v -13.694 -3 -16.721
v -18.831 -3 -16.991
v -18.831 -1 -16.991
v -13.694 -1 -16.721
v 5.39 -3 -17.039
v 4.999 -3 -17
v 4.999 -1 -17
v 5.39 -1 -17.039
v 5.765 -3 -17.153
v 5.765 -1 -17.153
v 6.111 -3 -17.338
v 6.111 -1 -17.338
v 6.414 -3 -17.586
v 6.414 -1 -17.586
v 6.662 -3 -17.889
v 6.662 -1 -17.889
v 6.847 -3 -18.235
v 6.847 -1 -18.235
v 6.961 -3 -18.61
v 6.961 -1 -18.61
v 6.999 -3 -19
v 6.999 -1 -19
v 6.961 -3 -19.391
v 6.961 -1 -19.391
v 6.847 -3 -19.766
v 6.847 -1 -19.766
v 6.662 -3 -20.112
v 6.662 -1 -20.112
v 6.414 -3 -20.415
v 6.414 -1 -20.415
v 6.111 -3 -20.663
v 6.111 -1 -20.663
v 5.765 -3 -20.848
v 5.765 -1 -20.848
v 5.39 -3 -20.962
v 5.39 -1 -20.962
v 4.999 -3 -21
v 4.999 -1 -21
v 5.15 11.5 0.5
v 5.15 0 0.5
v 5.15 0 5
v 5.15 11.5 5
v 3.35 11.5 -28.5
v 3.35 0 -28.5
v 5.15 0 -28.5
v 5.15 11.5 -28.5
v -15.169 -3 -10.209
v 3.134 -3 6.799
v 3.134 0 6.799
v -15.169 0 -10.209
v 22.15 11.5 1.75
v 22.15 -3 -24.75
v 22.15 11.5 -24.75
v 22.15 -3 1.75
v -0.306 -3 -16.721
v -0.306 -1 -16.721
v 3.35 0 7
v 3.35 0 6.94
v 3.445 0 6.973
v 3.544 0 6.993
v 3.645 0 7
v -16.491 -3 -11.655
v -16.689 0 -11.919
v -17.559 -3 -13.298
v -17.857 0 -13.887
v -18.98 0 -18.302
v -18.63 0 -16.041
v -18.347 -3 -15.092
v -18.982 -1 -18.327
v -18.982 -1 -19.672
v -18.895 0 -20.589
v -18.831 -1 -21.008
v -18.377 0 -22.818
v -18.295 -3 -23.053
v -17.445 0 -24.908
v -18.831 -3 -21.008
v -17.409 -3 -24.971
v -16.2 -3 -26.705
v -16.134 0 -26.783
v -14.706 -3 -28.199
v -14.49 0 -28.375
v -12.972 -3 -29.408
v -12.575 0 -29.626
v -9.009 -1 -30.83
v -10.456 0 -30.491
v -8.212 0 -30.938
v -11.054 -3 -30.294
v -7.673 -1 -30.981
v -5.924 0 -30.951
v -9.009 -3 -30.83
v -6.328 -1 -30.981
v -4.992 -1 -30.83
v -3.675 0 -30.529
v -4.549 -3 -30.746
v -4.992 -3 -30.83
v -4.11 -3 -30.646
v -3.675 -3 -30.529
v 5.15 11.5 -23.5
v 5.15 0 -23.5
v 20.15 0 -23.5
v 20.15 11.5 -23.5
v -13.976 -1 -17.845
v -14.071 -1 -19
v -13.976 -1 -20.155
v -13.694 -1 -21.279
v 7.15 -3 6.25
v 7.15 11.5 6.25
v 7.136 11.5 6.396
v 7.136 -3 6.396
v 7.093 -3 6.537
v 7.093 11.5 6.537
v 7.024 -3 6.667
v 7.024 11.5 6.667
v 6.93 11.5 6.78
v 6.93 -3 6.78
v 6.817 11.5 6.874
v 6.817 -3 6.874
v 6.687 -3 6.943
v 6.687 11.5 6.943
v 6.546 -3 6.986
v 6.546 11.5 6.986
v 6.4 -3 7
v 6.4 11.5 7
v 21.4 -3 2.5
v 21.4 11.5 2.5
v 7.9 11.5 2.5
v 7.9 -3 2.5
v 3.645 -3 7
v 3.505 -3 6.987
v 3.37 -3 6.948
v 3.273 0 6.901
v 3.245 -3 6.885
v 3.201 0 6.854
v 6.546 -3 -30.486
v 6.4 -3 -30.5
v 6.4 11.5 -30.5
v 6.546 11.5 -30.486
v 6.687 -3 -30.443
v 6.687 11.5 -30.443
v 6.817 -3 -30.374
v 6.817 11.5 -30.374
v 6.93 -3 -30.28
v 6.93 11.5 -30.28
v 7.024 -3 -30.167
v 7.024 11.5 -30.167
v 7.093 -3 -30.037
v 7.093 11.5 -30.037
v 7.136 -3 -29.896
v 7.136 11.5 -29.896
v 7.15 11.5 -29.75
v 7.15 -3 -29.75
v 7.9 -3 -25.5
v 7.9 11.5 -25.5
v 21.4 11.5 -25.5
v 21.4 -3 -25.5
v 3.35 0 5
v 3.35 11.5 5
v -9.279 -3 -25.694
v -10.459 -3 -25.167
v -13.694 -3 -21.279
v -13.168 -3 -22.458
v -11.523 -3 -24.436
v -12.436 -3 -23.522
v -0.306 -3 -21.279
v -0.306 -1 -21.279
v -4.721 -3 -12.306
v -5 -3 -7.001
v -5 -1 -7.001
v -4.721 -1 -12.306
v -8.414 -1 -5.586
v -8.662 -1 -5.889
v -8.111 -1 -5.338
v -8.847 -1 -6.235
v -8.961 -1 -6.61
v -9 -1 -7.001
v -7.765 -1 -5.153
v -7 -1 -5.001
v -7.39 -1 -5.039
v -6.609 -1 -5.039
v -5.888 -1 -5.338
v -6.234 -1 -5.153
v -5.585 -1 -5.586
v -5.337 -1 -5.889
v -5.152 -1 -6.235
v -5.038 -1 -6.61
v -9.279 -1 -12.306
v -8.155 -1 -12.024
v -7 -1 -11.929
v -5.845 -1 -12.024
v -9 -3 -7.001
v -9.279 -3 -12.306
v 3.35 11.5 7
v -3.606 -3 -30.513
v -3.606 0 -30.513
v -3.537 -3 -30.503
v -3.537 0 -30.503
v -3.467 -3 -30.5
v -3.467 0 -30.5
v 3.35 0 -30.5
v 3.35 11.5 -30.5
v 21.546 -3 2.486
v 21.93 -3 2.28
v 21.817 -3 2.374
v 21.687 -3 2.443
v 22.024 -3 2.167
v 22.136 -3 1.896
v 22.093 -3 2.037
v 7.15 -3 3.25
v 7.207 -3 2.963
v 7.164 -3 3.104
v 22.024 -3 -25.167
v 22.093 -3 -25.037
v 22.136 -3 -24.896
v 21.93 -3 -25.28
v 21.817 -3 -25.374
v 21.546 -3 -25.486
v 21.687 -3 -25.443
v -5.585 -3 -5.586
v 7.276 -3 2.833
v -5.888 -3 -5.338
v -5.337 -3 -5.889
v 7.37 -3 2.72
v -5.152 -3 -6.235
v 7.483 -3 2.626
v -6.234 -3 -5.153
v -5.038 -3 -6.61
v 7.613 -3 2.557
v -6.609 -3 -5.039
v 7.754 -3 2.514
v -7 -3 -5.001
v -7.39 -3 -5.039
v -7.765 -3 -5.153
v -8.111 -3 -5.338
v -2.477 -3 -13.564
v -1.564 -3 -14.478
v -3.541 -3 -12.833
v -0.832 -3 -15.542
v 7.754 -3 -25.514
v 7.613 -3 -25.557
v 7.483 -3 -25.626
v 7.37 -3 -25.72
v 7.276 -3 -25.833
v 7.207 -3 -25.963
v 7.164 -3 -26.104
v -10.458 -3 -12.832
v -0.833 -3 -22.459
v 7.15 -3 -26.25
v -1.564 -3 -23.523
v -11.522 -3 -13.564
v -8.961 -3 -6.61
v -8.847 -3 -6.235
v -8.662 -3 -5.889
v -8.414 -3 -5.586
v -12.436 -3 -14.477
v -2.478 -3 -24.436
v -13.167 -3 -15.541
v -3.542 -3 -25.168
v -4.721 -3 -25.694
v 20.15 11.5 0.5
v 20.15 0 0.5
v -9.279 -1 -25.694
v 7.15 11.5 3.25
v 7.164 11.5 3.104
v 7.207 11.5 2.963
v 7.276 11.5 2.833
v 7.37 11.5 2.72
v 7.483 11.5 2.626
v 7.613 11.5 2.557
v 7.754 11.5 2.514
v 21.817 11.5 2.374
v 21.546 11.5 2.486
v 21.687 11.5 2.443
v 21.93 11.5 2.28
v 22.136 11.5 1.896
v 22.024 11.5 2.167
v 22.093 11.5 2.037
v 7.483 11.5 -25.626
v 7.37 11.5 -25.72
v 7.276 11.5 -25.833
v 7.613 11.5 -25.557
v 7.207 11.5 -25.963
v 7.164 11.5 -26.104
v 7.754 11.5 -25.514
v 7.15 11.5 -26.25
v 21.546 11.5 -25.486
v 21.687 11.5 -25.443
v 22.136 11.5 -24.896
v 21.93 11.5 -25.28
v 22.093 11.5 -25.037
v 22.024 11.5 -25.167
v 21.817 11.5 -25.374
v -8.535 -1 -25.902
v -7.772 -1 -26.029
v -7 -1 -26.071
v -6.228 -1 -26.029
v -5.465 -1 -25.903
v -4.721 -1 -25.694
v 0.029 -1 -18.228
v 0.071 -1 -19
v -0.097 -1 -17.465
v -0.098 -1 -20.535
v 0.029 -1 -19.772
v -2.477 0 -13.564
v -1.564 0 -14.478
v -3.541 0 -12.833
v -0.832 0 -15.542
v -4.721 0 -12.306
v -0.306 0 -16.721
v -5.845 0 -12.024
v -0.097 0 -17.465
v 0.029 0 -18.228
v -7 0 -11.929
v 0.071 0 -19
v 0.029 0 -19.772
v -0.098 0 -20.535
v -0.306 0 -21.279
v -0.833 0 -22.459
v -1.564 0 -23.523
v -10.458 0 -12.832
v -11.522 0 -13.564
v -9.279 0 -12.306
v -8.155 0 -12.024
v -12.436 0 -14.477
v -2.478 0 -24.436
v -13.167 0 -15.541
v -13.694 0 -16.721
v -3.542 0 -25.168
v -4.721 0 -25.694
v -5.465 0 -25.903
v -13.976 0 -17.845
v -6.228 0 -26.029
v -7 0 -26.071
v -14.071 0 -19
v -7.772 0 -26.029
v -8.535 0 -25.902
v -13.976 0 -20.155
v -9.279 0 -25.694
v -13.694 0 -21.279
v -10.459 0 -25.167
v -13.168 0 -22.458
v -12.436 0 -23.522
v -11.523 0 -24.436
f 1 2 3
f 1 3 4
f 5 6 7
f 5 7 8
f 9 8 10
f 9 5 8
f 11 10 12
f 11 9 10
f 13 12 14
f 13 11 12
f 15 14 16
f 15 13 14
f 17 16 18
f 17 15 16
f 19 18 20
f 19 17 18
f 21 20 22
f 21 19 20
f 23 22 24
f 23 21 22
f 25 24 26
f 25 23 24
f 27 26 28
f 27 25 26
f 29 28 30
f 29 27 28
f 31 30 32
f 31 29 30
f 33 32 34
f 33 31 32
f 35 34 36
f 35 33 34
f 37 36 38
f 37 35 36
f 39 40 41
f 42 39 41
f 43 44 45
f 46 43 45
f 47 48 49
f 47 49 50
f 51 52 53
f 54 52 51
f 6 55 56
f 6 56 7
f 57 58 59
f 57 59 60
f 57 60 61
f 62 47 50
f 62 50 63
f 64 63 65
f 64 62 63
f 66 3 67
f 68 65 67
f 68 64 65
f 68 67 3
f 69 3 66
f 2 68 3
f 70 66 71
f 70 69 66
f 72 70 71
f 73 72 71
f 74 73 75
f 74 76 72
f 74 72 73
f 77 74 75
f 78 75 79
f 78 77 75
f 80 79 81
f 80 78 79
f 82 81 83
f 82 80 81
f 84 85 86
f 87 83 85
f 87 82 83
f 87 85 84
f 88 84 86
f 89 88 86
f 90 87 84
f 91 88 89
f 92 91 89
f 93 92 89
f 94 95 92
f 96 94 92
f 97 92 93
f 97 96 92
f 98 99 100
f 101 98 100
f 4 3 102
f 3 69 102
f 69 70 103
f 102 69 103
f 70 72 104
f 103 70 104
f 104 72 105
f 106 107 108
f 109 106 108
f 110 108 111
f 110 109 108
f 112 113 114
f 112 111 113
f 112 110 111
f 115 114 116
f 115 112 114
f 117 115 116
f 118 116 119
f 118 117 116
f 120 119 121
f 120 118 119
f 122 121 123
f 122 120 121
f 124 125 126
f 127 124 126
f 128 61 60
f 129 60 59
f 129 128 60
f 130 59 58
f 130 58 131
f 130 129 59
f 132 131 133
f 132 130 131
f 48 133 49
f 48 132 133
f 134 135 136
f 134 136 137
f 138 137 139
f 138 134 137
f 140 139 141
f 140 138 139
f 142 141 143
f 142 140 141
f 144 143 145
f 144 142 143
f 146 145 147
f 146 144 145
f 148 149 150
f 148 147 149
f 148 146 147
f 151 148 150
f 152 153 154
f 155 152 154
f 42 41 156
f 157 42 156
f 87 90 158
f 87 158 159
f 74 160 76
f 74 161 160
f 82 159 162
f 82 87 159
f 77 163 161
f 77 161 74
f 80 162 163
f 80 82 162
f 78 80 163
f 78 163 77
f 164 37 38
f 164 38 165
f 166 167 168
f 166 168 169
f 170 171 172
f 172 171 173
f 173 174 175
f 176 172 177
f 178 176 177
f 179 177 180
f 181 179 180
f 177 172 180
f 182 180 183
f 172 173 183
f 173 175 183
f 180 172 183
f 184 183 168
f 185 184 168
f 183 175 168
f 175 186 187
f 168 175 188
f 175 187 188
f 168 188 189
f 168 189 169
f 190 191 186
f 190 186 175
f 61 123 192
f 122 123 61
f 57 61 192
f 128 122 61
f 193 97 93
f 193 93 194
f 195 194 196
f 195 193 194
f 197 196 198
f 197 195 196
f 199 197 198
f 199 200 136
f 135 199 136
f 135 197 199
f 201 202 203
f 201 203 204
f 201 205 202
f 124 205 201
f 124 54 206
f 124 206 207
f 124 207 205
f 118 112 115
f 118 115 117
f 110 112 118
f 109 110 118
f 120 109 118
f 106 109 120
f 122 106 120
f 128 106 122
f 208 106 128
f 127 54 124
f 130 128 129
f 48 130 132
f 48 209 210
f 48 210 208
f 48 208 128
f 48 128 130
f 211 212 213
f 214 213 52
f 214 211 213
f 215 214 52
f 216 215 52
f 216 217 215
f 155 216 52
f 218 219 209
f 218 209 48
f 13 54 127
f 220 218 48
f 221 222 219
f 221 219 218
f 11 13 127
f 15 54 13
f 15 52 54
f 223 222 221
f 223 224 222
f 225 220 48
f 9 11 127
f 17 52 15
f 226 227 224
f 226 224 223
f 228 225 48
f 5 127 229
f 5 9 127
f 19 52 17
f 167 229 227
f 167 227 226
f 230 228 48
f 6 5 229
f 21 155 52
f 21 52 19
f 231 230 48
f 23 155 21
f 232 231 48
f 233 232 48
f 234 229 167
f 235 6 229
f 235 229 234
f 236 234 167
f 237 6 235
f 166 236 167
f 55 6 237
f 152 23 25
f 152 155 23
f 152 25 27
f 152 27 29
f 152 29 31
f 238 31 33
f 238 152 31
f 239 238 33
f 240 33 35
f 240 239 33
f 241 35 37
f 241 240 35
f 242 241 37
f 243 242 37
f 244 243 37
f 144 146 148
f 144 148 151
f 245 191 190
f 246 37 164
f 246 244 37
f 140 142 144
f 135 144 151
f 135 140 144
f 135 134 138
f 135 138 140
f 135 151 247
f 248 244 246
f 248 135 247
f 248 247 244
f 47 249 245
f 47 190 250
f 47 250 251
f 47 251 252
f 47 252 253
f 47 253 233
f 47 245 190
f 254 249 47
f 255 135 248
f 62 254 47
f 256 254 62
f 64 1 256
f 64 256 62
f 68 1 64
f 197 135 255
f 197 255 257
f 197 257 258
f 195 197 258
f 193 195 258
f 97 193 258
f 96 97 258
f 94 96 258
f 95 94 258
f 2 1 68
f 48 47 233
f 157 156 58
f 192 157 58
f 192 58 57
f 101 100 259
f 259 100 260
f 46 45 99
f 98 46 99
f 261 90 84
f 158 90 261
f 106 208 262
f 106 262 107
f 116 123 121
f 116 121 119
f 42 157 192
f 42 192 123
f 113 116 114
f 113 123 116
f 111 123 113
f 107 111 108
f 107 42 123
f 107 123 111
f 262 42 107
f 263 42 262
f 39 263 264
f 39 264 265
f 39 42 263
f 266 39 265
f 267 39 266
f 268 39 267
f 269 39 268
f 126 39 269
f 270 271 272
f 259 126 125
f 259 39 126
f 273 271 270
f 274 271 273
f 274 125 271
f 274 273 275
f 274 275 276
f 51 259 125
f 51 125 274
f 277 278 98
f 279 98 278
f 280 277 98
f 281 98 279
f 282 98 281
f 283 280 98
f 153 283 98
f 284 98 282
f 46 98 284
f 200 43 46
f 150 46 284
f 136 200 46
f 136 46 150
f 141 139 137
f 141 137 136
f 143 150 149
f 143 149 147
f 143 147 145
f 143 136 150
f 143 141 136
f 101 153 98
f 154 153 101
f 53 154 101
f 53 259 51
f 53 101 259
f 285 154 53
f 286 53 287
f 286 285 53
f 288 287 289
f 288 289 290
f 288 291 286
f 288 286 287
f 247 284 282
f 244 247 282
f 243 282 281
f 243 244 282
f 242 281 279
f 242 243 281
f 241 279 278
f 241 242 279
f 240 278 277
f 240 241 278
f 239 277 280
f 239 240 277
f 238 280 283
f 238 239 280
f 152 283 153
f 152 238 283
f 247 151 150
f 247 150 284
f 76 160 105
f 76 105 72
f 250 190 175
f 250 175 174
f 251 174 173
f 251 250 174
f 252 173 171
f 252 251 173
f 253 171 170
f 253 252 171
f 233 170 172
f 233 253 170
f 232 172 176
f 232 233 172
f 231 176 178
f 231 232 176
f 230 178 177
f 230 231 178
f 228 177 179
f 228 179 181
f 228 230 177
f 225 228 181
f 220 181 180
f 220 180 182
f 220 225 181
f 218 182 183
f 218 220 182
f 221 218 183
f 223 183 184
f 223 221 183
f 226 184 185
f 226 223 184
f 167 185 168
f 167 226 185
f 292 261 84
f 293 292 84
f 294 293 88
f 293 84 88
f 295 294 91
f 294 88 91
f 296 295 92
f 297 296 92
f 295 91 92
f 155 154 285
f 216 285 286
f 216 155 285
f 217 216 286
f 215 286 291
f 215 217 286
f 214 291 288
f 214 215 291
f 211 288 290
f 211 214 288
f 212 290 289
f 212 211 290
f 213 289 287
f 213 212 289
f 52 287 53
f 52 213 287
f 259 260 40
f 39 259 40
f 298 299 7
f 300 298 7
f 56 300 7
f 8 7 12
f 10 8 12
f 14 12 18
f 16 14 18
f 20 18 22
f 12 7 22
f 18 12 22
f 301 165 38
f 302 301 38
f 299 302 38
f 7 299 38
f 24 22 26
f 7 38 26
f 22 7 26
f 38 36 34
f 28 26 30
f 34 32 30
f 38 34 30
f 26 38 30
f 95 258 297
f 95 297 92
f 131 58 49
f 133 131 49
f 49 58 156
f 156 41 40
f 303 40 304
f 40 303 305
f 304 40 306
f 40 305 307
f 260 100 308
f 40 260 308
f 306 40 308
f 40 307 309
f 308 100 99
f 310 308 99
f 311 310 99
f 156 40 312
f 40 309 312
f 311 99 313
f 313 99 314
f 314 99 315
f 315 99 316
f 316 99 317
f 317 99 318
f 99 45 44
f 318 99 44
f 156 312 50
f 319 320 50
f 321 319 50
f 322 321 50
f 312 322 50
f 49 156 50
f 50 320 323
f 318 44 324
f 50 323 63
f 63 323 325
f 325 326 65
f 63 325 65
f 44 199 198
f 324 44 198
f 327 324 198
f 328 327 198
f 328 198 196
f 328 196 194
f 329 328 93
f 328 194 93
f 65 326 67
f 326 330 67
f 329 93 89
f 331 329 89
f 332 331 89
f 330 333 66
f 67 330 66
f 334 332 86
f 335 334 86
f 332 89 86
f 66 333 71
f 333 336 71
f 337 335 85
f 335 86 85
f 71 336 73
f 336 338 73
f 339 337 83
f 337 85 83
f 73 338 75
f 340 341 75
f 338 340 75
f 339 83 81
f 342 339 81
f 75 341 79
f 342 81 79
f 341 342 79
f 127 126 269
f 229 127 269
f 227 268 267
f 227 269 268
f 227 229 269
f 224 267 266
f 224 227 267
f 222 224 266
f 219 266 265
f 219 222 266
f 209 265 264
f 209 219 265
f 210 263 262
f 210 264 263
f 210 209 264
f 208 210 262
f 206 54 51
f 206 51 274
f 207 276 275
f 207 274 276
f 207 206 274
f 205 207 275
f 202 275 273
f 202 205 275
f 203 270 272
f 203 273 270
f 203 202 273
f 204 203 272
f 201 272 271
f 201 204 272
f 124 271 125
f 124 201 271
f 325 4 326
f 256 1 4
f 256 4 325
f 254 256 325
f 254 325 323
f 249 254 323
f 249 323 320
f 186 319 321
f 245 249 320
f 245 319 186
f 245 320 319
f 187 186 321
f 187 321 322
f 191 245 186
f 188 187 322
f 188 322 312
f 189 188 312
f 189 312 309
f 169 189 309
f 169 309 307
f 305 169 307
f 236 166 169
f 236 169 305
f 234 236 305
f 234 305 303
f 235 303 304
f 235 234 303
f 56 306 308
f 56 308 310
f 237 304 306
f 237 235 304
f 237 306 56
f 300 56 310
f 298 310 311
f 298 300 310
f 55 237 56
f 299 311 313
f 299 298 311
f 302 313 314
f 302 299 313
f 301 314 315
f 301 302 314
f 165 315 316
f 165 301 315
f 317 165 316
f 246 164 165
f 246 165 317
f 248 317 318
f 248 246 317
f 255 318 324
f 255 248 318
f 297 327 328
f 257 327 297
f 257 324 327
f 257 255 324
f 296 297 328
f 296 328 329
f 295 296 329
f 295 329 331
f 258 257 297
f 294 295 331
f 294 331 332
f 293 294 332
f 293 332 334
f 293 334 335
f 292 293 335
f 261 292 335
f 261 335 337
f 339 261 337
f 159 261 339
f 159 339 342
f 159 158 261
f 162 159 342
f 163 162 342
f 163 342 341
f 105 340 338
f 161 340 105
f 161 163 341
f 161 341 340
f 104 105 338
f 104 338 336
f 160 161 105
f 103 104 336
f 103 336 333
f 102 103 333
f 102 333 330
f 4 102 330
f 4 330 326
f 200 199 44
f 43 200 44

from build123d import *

# Parameters (mm, degrees)
BRACKET_DEPTH       = 11.5
BOSS_EXTRUDE1_START = -3
BOSS_EXTRUDE1_DEPTH = 3
CUT_EXTRUDE1_START  = -3
CUT_EXTRUDE1_DEPTH  = 2
CUT_EXTRUDE2_START  = -2.5
SKETCH15_4_W        = 5
SKETCH15_4_H        = 5
CUT_EXTRUDE2_DEPTH  = 2.5


with BuildPart() as part:
    # Sketch9 → Bracket (new body)
    with BuildSketch(Plane(origin=(0, 0, 0), x_dir=(1, 0, 0), z_dir=(0, 1, 0))):
        with BuildLine():
            Line((5.15, -5), (4.65, -5))
            Line((4.65, -5), (3.35, -5))
            Line((3.35, -5), (3.35, -7))
            Line((3.35, -7), (6.4, -7))
            ThreePointArc((6.4, -7), (6.930330086, -6.780330086), (7.15, -6.25))
            Line((7.15, -6.25), (7.15, -5))
            Line((7.15, -5), (7.15, -3.25))
            ThreePointArc((7.15, -3.25), (7.369669914, -2.719669914), (7.9, -2.5))
            Line((7.9, -2.5), (21.4, -2.5))
            ThreePointArc((21.4, -2.5), (21.930330086, -2.280330086), (22.15, -1.75))
            Line((22.15, -1.75), (22.15, 24.75))
            ThreePointArc((22.15, 24.75), (21.930330086, 25.280330086), (21.4, 25.5))
            Line((21.4, 25.5), (7.9, 25.5))
            ThreePointArc((7.9, 25.5), (7.369669914, 25.719669914), (7.15, 26.25))
            Line((7.15, 26.25), (7.15, 28))
            Line((7.15, 28), (7.15, 29.75))
            ThreePointArc((7.15, 29.75), (6.930330086, 30.280330086), (6.4, 30.5))
            Line((6.4, 30.5), (5.15, 30.5))
            Line((5.15, 30.5), (3.35, 30.5))
            Line((3.35, 30.5), (3.35, 28.5))
            Line((3.35, 28.5), (5.15, 28.5))
            Line((5.15, 28.5), (5.15, 28))
            Line((5.15, 28), (5.15, 23.5))
            Line((5.15, 23.5), (20.15, 23.5))
            Line((20.15, 23.5), (20.15, -0.5))
            Line((20.15, -0.5), (5.15, -0.5))
            Line((5.15, -0.5), (5.15, -5))
        make_face()
    extrude(amount=BRACKET_DEPTH)

    # Sketch12 → Boss-Extrude1 (add)
    with BuildSketch(Plane(origin=(0, 0, 0), x_dir=(1, 0, 0), z_dir=(0, 1, 0)).offset(BOSS_EXTRUDE1_START)):
        with BuildLine():
            Line((3.134136634, -6.799408153), (-15.169112008, 10.208954707))
            ThreePointArc((-15.169112008, 10.208954707), (-17.445237733, 24.907700028), (-3.6745965, 30.529381479))
            ThreePointArc((-3.6745965, 30.529381479), (-3.571695801, 30.507381696), (-3.466728879, 30.5))
            Line((-3.466728879, 30.5), (6.4, 30.5))
            ThreePointArc((6.4, 30.5), (6.930330086, 30.280330086), (7.15, 29.75))
            Line((7.15, 29.75), (7.15, 26.25))
            ThreePointArc((7.15, 26.25), (7.369669914, 25.719669914), (7.9, 25.5))
            Line((7.9, 25.5), (21.4, 25.5))
            ThreePointArc((21.4, 25.5), (21.930330086, 25.280330086), (22.15, 24.75))
            Line((22.15, 24.75), (22.15, -1.75))
            ThreePointArc((22.15, -1.75), (21.930330086, -2.280330086), (21.4, -2.5))
            Line((21.4, -2.5), (7.9, -2.5))
            ThreePointArc((7.9, -2.5), (7.369669914, -2.719669914), (7.15, -3.25))
            Line((7.15, -3.25), (7.15, -6.25))
            ThreePointArc((7.15, -6.25), (6.930330086, -6.780330086), (6.4, -7))
            Line((6.4, -7), (3.644676233, -7))
            ThreePointArc((3.644676233, -7), (3.370410043, -6.948053048), (3.134136634, -6.799408153))
        make_face()
    extrude(amount=BOSS_EXTRUDE1_DEPTH)

    # Sketch15 → Cut-Extrude1 (cut)
    with BuildSketch(Plane(origin=(0, 0, 0), x_dir=(1, 0, 0), z_dir=(0, 1, 0)).offset(CUT_EXTRUDE1_START)):
        with BuildLine():
            Line((-9.279054633, 12.306278316), (-8.999521572, 7.000514852))
            ThreePointArc((-8.999521572, 7.000514852), (-6.999521572, 5.000514852), (-4.999521572, 7.000514852))
            Line((-4.999521572, 7.000514852), (-4.720515244, 12.306424778))
            ThreePointArc((-4.720515244, 12.306424778), (-1.999839357, 14.000160648), (-0.306278316, 16.720945367))
            Line((-0.306278316, 16.720945367), (4.999485148, 17.000478428))
            ThreePointArc((4.999485148, 17.000478428), (6.999485148, 19.000478428), (4.999485148, 21.000478428))
            Line((4.999485148, 21.000478428), (-0.306424778, 21.279484756))
            ThreePointArc((-0.306424778, 21.279484756), (-2.000160648, 24.000160643), (-4.720945367, 25.693721684))
            Line((-4.720945367, 25.693721684), (-5.000478428, 30.999485148))
            ThreePointArc((-5.000478428, 30.999485148), (-7.000478428, 32.999485148), (-9.000478428, 30.999485148))
            Line((-9.000478428, 30.999485148), (-9.279484756, 25.693575222))
            ThreePointArc((-9.279484756, 25.693575222), (-12.000160643, 23.999839352), (-13.693721684, 21.279054633))
            Line((-13.693721684, 21.279054633), (-18.999485148, 20.999521572))
            ThreePointArc((-18.999485148, 20.999521572), (-20.999485148, 18.999521572), (-18.999485148, 16.999521572))
            Line((-18.999485148, 16.999521572), (-13.693575222, 16.720515244))
            ThreePointArc((-13.693575222, 16.720515244), (-11.999839352, 13.999839357), (-9.279054633, 12.306278316))
        make_face()
    extrude(amount=CUT_EXTRUDE1_DEPTH, mode=Mode.SUBTRACT)

    # Sketch15<4> → Cut-Extrude2 (cut)
    with BuildSketch(Plane(origin=(0, 0, 0), x_dir=(1, 0, 0), z_dir=(0, 1, 0)).offset(CUT_EXTRUDE2_START)):
        with BuildLine():
            Line((-13.693721684, 21.279054633), (-9.5, 21.5))
            Line((-9.5, 21.5), (-9.279484756, 25.693575222))
            ThreePointArc((-9.279484756, 25.693575222), (-12.000160643, 23.999839352), (-13.693721684, 21.279054633))
        make_face()
        with BuildLine():
            Line((-9.5, 21.5), (-7.000099677, 21.5))
            Line((-7.000099677, 21.5), (-7.000281928, 26.071067806))
            ThreePointArc((-7.000281928, 26.071067806), (-8.155404343, 25.976033314), (-9.279484756, 25.693575222))
            Line((-9.279484756, 25.693575222), (-9.5, 21.5))
        make_face()
        with BuildLine():
            Line((-7.000099677, 21.5), (-4.5, 21.5))
            Line((-4.5, 21.5), (-4.720945367, 25.693721684))
            ThreePointArc((-4.720945367, 25.693721684), (-5.845097933, 25.976116485), (-7.000281928, 26.071067806))
            Line((-7.000281928, 26.071067806), (-7.000099677, 21.5))
        make_face()
        with BuildLine():
            Line((-4.720945367, 25.693721684), (-4.5, 21.5))
            Line((-4.5, 21.5), (-0.306424778, 21.279484756))
            ThreePointArc((-0.306424778, 21.279484756), (-2.000160648, 24.000160643), (-4.720945367, 25.693721684))
        make_face()
        with BuildLine():
            Line((-0.306278316, 16.720945367), (-4.5, 16.5))
            Line((-4.5, 16.5), (-4.720515244, 12.306424778))
            ThreePointArc((-4.720515244, 12.306424778), (-1.999839357, 14.000160648), (-0.306278316, 16.720945367))
        make_face()
        with BuildLine():
            Line((-0.306424778, 21.279484756), (-4.5, 21.5))
            Line((-4.5, 21.5), (-4.5, 16.5))
            Line((-4.5, 16.5), (-0.306278316, 16.720945367))
            ThreePointArc((-0.306278316, 16.720945367), (-0.023906539, 17.844958862), (0.071067812, 19))
            ThreePointArc((0.071067812, 19), (-0.023943654, 20.155265273), (-0.306424778, 21.279484756))
        make_face()
        with Locations((-7, 19)):
            Rectangle(SKETCH15_4_W, SKETCH15_4_H)
        with BuildLine():
            Line((-4.720515244, 12.306424778), (-4.5, 16.5))
            Line((-4.5, 16.5), (-9.5, 16.5))
            Line((-9.5, 16.5), (-9.279054633, 12.306278316))
            ThreePointArc((-9.279054633, 12.306278316), (-6.999772812, 11.928932192), (-4.720515244, 12.306424778))
        make_face()
        with BuildLine():
            Line((-9.5, 16.5), (-9.5, 21.5))
            Line((-9.5, 21.5), (-13.693721684, 21.279054633))
            ThreePointArc((-13.693721684, 21.279054633), (-14.071067808, 18.999772812), (-13.693575222, 16.720515244))
            Line((-13.693575222, 16.720515244), (-9.5, 16.5))
        make_face()
        with BuildLine():
            Line((-9.279054633, 12.306278316), (-9.5, 16.5))
            Line((-9.5, 16.5), (-13.693575222, 16.720515244))
            ThreePointArc((-13.693575222, 16.720515244), (-11.999839352, 13.999839357), (-9.279054633, 12.306278316))
        make_face()
    extrude(amount=CUT_EXTRUDE2_DEPTH, mode=Mode.SUBTRACT)


solid = part.part
